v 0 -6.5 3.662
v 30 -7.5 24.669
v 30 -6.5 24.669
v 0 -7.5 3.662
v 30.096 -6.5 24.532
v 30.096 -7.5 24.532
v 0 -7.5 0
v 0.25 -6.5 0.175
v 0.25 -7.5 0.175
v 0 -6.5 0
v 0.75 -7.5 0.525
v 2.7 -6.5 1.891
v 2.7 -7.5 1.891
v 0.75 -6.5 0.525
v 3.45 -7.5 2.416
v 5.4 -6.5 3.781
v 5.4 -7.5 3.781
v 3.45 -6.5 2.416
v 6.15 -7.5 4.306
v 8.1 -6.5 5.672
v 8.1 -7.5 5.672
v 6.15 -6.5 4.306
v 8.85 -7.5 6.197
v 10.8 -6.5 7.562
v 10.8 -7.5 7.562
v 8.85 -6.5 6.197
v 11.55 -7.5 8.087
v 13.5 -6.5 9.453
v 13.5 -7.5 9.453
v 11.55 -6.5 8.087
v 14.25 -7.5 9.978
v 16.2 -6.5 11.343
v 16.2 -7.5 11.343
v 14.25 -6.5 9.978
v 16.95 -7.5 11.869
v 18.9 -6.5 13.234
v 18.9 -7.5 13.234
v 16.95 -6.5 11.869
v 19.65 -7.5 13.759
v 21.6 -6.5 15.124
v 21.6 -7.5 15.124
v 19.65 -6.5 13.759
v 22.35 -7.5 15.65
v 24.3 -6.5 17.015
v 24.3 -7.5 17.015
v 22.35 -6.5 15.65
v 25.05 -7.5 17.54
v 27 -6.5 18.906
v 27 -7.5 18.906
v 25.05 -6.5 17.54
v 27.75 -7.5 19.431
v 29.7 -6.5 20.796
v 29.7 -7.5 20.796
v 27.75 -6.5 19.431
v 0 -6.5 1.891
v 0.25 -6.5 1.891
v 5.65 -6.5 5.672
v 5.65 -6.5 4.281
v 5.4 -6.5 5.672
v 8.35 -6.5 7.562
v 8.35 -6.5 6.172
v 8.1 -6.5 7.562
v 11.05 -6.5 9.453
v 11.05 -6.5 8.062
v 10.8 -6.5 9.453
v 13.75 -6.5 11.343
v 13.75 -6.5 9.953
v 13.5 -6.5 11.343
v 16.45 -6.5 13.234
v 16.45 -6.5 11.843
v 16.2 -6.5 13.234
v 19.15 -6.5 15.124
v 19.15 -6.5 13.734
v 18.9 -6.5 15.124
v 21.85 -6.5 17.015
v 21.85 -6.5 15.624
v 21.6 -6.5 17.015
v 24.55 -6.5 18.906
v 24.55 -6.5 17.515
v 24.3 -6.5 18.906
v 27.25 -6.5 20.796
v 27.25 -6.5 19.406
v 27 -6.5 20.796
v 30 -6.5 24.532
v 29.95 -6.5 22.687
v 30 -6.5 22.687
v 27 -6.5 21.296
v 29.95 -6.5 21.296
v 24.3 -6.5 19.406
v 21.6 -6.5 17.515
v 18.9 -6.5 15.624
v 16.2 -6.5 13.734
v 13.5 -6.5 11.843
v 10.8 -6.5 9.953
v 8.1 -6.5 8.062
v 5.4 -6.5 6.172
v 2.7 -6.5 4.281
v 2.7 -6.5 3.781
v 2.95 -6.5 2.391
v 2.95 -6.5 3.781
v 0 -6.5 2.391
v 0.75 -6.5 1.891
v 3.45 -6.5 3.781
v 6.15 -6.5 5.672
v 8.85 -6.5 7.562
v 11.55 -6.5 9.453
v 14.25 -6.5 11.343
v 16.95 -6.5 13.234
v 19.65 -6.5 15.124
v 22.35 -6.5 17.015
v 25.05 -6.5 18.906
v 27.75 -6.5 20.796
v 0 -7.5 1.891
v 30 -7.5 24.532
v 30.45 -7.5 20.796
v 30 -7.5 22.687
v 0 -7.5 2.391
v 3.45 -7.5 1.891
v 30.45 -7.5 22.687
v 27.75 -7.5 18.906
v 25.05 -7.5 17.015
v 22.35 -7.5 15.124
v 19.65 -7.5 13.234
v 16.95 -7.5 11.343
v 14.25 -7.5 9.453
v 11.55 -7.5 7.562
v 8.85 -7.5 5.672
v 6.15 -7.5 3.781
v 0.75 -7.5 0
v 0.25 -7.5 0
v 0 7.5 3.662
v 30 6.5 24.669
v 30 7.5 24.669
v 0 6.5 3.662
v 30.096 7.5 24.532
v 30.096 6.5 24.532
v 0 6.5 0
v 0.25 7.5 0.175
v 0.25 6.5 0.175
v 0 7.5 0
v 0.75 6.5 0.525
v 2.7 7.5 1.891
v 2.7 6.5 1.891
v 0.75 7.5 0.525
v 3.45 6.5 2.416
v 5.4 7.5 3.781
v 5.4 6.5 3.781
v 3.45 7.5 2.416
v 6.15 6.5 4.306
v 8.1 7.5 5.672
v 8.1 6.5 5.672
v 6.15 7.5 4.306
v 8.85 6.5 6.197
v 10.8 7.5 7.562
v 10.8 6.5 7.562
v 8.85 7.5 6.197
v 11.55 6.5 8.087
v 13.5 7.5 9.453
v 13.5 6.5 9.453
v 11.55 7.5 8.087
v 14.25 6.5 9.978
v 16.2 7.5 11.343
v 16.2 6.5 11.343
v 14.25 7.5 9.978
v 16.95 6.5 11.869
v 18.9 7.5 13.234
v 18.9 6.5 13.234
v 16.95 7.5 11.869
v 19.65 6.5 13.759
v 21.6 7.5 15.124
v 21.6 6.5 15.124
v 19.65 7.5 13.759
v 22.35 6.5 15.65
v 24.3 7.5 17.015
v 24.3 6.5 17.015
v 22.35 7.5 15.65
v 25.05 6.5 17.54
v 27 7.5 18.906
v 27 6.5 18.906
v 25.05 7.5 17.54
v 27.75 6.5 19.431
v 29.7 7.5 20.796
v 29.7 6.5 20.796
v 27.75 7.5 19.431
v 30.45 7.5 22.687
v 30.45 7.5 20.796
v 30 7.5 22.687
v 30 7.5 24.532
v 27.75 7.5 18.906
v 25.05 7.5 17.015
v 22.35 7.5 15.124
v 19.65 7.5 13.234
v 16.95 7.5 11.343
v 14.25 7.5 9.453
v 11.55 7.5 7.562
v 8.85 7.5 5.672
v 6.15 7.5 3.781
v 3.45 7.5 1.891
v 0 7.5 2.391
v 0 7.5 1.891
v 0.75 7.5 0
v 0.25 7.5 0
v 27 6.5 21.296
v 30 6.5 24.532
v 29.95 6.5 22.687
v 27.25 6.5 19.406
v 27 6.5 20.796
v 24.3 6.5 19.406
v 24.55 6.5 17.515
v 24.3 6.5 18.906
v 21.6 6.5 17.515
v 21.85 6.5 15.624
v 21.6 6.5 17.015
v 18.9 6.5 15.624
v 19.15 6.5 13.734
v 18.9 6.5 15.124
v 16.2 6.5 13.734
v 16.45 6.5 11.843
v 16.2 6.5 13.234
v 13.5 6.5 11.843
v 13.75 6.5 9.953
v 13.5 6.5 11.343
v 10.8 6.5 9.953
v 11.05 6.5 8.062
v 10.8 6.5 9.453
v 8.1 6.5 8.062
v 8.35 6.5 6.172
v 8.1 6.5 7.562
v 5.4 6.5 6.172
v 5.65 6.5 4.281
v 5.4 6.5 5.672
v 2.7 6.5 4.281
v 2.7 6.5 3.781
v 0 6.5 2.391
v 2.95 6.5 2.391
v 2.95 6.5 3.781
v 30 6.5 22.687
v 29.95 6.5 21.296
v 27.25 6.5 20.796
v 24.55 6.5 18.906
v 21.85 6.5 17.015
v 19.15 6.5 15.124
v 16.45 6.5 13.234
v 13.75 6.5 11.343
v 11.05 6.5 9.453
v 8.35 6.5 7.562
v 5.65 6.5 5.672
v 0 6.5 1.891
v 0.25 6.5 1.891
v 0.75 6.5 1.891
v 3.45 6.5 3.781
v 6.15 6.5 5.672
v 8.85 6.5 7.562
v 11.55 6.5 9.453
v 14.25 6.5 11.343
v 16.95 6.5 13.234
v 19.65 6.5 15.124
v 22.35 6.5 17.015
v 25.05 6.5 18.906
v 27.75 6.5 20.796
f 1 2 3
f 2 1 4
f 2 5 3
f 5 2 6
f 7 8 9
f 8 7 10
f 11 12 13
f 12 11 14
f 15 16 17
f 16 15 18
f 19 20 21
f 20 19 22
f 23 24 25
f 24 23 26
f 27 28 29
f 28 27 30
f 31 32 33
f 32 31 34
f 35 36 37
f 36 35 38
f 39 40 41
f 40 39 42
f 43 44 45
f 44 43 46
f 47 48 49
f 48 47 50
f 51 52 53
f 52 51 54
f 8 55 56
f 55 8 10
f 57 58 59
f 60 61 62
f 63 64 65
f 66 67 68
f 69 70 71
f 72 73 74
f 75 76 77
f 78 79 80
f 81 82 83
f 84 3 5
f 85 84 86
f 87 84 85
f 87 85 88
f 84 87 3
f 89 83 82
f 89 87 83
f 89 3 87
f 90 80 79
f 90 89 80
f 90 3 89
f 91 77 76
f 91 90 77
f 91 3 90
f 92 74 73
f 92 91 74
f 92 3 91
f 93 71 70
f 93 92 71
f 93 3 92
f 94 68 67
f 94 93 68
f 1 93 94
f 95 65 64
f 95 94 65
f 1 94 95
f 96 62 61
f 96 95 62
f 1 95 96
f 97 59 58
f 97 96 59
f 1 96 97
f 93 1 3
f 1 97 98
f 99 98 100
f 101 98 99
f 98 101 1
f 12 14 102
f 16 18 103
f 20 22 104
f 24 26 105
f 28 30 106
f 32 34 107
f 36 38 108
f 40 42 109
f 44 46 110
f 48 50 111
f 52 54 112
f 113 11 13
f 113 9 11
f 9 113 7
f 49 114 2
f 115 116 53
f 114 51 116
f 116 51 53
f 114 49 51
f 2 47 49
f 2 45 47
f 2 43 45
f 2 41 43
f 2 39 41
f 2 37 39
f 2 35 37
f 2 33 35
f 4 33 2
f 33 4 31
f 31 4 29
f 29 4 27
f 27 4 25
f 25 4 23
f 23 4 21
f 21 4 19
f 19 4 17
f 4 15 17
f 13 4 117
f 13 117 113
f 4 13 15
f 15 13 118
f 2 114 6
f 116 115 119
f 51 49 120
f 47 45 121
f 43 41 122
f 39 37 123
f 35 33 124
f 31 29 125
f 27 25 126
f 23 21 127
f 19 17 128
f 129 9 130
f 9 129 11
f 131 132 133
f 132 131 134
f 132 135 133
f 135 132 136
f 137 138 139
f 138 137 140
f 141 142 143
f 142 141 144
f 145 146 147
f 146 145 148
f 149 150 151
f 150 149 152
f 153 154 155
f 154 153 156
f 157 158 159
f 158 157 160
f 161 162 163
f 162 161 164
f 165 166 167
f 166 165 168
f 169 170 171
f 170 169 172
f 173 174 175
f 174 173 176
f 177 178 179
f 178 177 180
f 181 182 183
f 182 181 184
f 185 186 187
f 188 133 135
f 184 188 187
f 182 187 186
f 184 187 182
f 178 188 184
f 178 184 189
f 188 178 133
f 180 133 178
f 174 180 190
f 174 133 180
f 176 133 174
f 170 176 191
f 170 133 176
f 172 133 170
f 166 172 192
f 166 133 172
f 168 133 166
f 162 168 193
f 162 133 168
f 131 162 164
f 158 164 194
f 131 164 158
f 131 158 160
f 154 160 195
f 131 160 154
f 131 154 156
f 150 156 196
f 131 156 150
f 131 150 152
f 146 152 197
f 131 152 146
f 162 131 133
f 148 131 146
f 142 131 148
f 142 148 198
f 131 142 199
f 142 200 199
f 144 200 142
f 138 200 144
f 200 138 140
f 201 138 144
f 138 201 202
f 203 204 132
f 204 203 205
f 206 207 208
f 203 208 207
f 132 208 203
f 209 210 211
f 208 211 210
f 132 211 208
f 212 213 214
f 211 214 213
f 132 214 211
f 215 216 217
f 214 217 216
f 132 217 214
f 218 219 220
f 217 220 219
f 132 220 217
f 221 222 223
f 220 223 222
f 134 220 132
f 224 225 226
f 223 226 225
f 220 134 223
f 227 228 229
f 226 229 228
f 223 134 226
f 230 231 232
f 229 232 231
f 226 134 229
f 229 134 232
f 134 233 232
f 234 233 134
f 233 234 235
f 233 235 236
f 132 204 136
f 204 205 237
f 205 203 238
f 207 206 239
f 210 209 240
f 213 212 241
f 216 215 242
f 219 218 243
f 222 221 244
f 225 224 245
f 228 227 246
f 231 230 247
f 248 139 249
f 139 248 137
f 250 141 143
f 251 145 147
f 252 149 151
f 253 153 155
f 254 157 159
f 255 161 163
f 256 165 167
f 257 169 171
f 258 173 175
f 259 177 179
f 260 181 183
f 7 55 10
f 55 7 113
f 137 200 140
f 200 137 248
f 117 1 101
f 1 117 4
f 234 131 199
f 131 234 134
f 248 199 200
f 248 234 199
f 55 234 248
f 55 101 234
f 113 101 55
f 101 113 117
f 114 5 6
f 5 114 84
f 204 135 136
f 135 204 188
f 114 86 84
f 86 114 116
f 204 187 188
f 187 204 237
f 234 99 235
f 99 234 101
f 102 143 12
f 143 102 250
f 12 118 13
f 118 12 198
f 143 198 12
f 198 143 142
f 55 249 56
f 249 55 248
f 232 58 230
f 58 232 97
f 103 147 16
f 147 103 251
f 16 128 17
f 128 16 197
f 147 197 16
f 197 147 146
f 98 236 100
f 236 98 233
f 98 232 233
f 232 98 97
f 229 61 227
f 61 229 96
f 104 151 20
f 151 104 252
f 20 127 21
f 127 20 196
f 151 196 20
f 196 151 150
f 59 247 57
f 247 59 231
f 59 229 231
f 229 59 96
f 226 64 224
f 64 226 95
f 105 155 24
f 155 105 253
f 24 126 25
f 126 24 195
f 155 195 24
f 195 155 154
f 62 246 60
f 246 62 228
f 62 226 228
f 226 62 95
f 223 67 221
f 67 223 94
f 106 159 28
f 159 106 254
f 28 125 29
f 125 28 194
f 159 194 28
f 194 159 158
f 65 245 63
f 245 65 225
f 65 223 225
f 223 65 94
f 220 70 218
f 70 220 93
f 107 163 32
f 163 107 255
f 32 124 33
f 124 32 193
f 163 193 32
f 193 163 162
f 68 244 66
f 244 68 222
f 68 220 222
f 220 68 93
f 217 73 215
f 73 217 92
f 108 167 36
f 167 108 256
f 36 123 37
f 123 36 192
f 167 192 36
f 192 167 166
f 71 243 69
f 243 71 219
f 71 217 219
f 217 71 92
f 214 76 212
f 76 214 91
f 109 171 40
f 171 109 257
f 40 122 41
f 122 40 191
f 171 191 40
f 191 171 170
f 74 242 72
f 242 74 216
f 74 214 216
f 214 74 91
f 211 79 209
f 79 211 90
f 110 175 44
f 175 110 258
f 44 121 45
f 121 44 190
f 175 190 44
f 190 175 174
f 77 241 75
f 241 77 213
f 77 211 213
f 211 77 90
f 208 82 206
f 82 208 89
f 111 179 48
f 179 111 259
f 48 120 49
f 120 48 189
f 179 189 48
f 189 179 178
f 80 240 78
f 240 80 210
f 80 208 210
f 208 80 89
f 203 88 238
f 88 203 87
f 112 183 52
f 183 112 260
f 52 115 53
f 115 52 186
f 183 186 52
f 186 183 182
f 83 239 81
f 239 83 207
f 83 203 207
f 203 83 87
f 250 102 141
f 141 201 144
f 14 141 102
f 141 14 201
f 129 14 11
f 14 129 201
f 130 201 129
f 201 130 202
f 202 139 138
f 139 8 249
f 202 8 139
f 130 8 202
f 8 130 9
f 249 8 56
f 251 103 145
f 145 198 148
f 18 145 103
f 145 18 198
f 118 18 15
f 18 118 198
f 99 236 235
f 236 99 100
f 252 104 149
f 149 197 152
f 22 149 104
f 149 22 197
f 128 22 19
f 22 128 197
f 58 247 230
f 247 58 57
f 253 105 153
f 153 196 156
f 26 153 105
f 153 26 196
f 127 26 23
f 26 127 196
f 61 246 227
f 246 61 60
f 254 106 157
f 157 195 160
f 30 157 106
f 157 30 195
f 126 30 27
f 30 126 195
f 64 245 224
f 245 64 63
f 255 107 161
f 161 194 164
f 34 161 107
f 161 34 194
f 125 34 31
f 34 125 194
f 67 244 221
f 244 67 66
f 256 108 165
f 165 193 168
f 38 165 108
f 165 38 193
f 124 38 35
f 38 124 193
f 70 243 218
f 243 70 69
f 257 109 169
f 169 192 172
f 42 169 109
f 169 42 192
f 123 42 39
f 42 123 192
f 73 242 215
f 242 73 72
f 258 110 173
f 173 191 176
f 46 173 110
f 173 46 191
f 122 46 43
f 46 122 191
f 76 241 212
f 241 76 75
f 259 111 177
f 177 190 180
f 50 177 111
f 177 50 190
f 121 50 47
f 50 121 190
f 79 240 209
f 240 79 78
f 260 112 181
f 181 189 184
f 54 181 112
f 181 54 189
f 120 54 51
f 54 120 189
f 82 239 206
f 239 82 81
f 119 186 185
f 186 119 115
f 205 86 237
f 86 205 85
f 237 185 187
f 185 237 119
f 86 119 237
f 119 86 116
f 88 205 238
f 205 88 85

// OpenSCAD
//Model Staircase Generator
//Written by Madam Mim 2016 
//All dimensions in mm unless otherwise stated. Inches are used in ECHO returns for a sanity check of tread and riser sizes to make sure that humans can actually climb it! 

scaleratio=1; //scale ratio. 2mmFS=152 Full size=1
//scaleratio=152; //scale ratio. 2mmFS=152 Full size=1

casewidth=15; //overall staircase width
caseangle=35; //Angle of staircase
caselength=30; //distance along the ground the staircase occupies

riserpresent=1; //set to 1 for risers to be included, 0 to be absent.
risersetback=0.25; //set back of the riser behind the tread edge.

treadwidth=3; //width of the tread timbers
treadthickness=0.5; //how thick the tread is
treads=12; //number of treads
pitch=(caselength-treadwidth)/(treads-2); //calculated distance between treads
sidedepth=3; //Depth of the staircase sides
sidethickness=1; //thickness of the timber of the sides.
riser=(pitch)*tan(caseangle); //height between treads
echo("Prototype Riser Height in inches", riser*scaleratio/25.4); //check riser height makes sense for human feet!
echo("Prototype Tread Pitch in inches", pitch*scaleratio/25.4); //check the space for feet to go makes sense!

//Calculate staircase height and length of side timbers.
caseheight=(caselength*tan(caseangle))+(sidedepth/cos(caseangle));
echo("Height of staircase mm",caseheight);
sidelength=(caselength/cos(caseangle))+(sidedepth*tan(caseangle));

//Place and rotate side timbers and subtract boxes at each end to get vertical ends.
difference()
{
    
    union() //Add two sides together to get one object to subtract from.
    {
        rotate([0,-caseangle,0]) translate([0,-casewidth/2]) cube([sidelength,sidethickness,sidedepth], center=false);

        rotate([0,-caseangle,0]) translate([0,casewidth/2-sidethickness]) cube([sidelength,sidethickness,sidedepth], center=false);
    }
    
    translate([-sidedepth/2,0,0.5*sidedepth/cos(caseangle)]) cube([sidedepth,2*casewidth,sidedepth/cos(caseangle)], center=true);
    
    translate([caselength,-casewidth,caselength*sin(caseangle)]) cube([sidedepth,2*casewidth,2*sidedepth/cos(caseangle)], center=false);
}

//Place the treads
for(t=[0:treads-2])
{
translate([pitch*t,-casewidth/2,t*riser+riser]) cube([treadwidth,casewidth,treadthickness], center=false);
}

//Place the risers
if (riserpresent==1) //check if risers should be included.
{
    for(r=[0:treads-1])
    {
        translate([pitch*r+risersetback,-casewidth/2,r*riser]) cube([treadthickness,casewidth,riser], center=false);
    }
}
